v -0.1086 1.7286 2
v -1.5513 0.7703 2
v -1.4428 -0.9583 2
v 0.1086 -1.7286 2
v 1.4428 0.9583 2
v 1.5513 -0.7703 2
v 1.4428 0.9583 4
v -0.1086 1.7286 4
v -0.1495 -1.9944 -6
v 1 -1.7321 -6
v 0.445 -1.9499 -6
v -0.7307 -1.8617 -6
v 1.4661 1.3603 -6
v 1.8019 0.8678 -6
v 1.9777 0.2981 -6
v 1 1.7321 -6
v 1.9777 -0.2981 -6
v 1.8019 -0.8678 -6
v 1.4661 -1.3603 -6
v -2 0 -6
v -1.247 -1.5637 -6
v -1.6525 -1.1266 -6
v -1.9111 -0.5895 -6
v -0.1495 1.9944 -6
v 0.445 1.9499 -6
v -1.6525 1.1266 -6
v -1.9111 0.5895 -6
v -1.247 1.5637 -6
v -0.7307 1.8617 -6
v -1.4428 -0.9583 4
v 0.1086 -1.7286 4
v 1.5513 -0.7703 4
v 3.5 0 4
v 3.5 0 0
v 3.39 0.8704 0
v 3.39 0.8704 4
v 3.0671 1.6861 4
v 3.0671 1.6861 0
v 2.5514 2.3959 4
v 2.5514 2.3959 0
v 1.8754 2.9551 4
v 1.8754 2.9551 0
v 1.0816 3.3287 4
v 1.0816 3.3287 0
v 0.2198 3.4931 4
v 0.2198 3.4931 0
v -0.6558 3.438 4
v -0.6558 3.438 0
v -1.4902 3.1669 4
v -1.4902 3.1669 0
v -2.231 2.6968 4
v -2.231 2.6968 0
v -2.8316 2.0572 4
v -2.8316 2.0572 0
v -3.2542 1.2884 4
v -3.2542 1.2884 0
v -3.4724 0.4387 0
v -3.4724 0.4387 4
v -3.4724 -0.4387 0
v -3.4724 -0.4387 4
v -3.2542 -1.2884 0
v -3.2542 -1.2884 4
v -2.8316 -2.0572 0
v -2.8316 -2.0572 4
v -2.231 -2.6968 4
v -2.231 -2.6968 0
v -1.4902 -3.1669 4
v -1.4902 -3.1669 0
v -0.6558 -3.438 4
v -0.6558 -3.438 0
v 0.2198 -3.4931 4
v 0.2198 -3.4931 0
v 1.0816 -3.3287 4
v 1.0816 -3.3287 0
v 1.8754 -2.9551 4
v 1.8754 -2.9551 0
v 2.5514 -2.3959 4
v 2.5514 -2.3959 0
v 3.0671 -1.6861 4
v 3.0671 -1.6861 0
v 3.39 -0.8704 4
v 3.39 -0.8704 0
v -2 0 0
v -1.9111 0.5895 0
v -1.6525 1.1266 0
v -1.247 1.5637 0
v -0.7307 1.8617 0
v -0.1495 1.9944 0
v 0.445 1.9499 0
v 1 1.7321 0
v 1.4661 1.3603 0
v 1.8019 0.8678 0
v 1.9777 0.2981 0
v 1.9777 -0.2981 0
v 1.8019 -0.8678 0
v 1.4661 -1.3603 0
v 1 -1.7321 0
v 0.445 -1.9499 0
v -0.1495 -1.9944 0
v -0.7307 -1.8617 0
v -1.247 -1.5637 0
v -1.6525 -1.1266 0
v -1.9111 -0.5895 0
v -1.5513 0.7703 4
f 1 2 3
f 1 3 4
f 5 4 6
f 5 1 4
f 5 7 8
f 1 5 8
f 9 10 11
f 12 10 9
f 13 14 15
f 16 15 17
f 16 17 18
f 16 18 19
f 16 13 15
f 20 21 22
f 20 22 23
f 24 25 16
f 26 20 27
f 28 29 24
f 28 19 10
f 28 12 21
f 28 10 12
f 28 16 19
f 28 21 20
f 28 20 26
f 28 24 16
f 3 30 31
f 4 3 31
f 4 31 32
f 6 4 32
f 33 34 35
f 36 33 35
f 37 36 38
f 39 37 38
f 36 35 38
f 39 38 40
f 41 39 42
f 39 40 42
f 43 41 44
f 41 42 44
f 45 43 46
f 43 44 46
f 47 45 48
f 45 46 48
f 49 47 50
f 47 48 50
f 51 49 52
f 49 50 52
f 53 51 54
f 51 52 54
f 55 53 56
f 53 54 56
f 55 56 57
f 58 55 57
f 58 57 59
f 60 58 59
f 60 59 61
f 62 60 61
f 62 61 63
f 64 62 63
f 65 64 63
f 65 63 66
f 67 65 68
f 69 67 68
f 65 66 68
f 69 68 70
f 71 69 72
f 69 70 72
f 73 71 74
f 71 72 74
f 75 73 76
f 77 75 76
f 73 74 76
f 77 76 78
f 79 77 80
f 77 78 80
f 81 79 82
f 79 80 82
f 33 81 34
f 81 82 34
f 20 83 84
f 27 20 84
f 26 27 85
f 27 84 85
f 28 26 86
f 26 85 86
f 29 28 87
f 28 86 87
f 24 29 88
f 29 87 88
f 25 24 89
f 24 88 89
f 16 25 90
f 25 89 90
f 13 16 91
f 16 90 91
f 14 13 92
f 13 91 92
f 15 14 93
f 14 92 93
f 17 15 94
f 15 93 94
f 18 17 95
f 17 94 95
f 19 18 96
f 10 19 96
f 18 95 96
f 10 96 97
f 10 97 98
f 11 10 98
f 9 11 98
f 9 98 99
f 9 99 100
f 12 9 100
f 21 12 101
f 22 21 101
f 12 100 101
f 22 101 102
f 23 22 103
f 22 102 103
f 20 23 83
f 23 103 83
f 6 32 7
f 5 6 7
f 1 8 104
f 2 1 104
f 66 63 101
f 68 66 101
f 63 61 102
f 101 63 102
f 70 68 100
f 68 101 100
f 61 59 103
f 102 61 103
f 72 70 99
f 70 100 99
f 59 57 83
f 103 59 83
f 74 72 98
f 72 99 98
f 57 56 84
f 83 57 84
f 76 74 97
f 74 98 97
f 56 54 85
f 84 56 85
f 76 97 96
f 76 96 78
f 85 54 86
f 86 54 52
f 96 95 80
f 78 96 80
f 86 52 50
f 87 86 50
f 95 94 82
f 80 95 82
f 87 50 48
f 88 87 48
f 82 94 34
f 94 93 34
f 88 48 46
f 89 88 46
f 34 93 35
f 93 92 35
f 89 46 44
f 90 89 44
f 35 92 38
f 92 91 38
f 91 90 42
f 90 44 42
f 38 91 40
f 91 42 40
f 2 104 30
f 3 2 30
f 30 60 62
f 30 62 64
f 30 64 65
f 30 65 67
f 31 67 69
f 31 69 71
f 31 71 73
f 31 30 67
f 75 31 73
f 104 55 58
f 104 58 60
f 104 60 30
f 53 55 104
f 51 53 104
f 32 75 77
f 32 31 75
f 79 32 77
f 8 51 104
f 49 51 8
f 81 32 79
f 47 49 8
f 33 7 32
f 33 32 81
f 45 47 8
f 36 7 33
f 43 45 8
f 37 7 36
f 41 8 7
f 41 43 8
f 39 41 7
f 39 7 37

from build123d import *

# Parameters (mm, degrees)
SKETCH_1_R          = 3.5
EXTRUDE_1_DEPTH     = 4
CUT_EXTRUDE_1_DEPTH = 2
SKETCH_3_R          = 2
EXTRUDE_2_DEPTH     = 6


with BuildPart() as part:
    # 草图1 → 凸台-拉伸1 (new body)
    with BuildSketch(Plane.XY):
        Circle(SKETCH_1_R)
    extrude(amount=EXTRUDE_1_DEPTH)

    # 草图2 → 切除-拉伸1 (cut)
    with BuildSketch(Plane.XY.offset(4)):
        Polygon((1.551335969, -0.77029651), (1.44276433, 0.958348104), (-0.108571638, 1.728644613), (-1.551335969, 0.77029651), (-1.44276433, -0.958348104), (0.108571638, -1.728644613), align=None)
    extrude(amount=-CUT_EXTRUDE_1_DEPTH, mode=Mode.SUBTRACT)

    # 草图3 → 凸台-拉伸2 (add)
    with BuildSketch(Plane(origin=(0, 0, 0), x_dir=(-1, 0, 0), z_dir=(0, 0, -1))):
        Circle(SKETCH_3_R)
    extrude(amount=EXTRUDE_2_DEPTH)


solid = part.part
